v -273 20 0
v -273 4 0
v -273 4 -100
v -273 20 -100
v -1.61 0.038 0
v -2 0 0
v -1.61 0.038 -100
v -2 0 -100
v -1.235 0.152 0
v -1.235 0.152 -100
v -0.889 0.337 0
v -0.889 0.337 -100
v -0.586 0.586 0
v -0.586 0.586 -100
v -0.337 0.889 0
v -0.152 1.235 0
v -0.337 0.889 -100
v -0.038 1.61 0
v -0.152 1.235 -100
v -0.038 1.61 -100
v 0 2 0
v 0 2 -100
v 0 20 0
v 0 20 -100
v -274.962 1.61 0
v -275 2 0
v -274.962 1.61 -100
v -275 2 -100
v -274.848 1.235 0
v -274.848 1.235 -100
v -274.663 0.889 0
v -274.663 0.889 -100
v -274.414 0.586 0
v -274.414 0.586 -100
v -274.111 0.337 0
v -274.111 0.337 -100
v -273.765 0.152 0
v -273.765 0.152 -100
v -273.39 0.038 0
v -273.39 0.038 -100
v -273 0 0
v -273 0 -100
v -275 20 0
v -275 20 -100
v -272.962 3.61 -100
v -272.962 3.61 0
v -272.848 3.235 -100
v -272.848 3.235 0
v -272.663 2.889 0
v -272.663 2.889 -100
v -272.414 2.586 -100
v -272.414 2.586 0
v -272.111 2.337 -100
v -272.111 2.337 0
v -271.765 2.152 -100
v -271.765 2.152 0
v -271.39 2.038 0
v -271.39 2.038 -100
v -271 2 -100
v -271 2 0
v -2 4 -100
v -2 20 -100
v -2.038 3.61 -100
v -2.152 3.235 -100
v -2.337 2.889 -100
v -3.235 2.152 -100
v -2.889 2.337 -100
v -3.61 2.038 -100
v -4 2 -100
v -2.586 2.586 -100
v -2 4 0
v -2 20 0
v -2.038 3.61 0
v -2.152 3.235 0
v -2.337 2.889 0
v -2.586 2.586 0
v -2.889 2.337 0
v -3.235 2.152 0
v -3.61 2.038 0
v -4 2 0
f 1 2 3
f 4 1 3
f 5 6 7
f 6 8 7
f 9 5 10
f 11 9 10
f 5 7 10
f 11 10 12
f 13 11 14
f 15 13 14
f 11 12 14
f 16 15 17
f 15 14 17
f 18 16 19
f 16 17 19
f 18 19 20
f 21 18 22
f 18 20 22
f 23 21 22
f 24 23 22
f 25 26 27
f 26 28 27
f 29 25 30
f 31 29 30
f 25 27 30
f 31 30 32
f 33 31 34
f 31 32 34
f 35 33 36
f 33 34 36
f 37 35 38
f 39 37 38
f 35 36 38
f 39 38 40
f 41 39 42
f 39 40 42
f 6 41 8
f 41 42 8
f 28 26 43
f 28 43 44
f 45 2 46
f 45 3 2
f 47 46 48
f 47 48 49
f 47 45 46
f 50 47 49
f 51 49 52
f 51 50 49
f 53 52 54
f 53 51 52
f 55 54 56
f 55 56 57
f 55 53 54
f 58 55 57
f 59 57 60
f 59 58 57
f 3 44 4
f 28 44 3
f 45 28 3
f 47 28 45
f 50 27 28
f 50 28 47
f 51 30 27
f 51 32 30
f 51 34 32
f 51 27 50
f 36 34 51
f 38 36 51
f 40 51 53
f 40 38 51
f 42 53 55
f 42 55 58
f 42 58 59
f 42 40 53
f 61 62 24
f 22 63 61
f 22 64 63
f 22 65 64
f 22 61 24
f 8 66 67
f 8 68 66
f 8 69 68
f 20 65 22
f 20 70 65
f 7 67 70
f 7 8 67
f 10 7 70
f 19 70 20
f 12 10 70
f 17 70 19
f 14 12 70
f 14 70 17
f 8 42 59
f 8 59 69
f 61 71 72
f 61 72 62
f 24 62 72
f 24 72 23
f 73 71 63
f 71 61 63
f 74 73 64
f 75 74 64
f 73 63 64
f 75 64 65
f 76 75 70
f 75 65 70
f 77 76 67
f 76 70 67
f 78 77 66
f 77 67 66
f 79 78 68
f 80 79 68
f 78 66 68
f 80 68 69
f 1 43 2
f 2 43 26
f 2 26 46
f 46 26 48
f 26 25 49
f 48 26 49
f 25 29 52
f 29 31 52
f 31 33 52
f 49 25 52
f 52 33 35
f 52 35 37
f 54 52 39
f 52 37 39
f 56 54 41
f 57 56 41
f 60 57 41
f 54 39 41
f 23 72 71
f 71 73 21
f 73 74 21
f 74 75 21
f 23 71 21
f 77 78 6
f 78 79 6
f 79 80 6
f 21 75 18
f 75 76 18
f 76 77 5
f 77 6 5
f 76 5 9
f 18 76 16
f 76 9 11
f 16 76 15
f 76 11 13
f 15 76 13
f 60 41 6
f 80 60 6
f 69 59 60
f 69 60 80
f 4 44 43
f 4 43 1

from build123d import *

# Parameters (mm, degrees)
SKETCH1_W           = 275
SKETCH1_H           = 100
BOSS_EXTRUDE1_DEPTH = 20
SHELL2_T            = -2
FILLET1_R           = 2


with BuildPart() as part:
    # Sketch1 → Boss-Extrude1 (new body)
    with BuildSketch(Plane(origin=(0, 0, 0), x_dir=(1, 0, 0), z_dir=(0, 1, 0))):
        with Locations((-137.5, 50)):
            Rectangle(SKETCH1_W, SKETCH1_H)
    extrude(amount=BOSS_EXTRUDE1_DEPTH)

    # Shell2
    shell2_openings = [part.faces().sort_by_distance(p)[0] for p in [
        (-137.5, 20, -50),
        (-137.5, 10, 0),
        (-137.5, 10, -100),
    ]]
    offset(amount=SHELL2_T, openings=shell2_openings, kind=Kind.INTERSECTION)

    # Fillet1
    fillet1_edges = [part.edges().sort_by_distance(p)[0] for p in [
        (-2, 2, -50),
        (-273, 2, -50),
        (-275, 0, -50),
        (0, 0, -50),
    ]]
    fillet(fillet1_edges, radius=FILLET1_R)


solid = part.part
